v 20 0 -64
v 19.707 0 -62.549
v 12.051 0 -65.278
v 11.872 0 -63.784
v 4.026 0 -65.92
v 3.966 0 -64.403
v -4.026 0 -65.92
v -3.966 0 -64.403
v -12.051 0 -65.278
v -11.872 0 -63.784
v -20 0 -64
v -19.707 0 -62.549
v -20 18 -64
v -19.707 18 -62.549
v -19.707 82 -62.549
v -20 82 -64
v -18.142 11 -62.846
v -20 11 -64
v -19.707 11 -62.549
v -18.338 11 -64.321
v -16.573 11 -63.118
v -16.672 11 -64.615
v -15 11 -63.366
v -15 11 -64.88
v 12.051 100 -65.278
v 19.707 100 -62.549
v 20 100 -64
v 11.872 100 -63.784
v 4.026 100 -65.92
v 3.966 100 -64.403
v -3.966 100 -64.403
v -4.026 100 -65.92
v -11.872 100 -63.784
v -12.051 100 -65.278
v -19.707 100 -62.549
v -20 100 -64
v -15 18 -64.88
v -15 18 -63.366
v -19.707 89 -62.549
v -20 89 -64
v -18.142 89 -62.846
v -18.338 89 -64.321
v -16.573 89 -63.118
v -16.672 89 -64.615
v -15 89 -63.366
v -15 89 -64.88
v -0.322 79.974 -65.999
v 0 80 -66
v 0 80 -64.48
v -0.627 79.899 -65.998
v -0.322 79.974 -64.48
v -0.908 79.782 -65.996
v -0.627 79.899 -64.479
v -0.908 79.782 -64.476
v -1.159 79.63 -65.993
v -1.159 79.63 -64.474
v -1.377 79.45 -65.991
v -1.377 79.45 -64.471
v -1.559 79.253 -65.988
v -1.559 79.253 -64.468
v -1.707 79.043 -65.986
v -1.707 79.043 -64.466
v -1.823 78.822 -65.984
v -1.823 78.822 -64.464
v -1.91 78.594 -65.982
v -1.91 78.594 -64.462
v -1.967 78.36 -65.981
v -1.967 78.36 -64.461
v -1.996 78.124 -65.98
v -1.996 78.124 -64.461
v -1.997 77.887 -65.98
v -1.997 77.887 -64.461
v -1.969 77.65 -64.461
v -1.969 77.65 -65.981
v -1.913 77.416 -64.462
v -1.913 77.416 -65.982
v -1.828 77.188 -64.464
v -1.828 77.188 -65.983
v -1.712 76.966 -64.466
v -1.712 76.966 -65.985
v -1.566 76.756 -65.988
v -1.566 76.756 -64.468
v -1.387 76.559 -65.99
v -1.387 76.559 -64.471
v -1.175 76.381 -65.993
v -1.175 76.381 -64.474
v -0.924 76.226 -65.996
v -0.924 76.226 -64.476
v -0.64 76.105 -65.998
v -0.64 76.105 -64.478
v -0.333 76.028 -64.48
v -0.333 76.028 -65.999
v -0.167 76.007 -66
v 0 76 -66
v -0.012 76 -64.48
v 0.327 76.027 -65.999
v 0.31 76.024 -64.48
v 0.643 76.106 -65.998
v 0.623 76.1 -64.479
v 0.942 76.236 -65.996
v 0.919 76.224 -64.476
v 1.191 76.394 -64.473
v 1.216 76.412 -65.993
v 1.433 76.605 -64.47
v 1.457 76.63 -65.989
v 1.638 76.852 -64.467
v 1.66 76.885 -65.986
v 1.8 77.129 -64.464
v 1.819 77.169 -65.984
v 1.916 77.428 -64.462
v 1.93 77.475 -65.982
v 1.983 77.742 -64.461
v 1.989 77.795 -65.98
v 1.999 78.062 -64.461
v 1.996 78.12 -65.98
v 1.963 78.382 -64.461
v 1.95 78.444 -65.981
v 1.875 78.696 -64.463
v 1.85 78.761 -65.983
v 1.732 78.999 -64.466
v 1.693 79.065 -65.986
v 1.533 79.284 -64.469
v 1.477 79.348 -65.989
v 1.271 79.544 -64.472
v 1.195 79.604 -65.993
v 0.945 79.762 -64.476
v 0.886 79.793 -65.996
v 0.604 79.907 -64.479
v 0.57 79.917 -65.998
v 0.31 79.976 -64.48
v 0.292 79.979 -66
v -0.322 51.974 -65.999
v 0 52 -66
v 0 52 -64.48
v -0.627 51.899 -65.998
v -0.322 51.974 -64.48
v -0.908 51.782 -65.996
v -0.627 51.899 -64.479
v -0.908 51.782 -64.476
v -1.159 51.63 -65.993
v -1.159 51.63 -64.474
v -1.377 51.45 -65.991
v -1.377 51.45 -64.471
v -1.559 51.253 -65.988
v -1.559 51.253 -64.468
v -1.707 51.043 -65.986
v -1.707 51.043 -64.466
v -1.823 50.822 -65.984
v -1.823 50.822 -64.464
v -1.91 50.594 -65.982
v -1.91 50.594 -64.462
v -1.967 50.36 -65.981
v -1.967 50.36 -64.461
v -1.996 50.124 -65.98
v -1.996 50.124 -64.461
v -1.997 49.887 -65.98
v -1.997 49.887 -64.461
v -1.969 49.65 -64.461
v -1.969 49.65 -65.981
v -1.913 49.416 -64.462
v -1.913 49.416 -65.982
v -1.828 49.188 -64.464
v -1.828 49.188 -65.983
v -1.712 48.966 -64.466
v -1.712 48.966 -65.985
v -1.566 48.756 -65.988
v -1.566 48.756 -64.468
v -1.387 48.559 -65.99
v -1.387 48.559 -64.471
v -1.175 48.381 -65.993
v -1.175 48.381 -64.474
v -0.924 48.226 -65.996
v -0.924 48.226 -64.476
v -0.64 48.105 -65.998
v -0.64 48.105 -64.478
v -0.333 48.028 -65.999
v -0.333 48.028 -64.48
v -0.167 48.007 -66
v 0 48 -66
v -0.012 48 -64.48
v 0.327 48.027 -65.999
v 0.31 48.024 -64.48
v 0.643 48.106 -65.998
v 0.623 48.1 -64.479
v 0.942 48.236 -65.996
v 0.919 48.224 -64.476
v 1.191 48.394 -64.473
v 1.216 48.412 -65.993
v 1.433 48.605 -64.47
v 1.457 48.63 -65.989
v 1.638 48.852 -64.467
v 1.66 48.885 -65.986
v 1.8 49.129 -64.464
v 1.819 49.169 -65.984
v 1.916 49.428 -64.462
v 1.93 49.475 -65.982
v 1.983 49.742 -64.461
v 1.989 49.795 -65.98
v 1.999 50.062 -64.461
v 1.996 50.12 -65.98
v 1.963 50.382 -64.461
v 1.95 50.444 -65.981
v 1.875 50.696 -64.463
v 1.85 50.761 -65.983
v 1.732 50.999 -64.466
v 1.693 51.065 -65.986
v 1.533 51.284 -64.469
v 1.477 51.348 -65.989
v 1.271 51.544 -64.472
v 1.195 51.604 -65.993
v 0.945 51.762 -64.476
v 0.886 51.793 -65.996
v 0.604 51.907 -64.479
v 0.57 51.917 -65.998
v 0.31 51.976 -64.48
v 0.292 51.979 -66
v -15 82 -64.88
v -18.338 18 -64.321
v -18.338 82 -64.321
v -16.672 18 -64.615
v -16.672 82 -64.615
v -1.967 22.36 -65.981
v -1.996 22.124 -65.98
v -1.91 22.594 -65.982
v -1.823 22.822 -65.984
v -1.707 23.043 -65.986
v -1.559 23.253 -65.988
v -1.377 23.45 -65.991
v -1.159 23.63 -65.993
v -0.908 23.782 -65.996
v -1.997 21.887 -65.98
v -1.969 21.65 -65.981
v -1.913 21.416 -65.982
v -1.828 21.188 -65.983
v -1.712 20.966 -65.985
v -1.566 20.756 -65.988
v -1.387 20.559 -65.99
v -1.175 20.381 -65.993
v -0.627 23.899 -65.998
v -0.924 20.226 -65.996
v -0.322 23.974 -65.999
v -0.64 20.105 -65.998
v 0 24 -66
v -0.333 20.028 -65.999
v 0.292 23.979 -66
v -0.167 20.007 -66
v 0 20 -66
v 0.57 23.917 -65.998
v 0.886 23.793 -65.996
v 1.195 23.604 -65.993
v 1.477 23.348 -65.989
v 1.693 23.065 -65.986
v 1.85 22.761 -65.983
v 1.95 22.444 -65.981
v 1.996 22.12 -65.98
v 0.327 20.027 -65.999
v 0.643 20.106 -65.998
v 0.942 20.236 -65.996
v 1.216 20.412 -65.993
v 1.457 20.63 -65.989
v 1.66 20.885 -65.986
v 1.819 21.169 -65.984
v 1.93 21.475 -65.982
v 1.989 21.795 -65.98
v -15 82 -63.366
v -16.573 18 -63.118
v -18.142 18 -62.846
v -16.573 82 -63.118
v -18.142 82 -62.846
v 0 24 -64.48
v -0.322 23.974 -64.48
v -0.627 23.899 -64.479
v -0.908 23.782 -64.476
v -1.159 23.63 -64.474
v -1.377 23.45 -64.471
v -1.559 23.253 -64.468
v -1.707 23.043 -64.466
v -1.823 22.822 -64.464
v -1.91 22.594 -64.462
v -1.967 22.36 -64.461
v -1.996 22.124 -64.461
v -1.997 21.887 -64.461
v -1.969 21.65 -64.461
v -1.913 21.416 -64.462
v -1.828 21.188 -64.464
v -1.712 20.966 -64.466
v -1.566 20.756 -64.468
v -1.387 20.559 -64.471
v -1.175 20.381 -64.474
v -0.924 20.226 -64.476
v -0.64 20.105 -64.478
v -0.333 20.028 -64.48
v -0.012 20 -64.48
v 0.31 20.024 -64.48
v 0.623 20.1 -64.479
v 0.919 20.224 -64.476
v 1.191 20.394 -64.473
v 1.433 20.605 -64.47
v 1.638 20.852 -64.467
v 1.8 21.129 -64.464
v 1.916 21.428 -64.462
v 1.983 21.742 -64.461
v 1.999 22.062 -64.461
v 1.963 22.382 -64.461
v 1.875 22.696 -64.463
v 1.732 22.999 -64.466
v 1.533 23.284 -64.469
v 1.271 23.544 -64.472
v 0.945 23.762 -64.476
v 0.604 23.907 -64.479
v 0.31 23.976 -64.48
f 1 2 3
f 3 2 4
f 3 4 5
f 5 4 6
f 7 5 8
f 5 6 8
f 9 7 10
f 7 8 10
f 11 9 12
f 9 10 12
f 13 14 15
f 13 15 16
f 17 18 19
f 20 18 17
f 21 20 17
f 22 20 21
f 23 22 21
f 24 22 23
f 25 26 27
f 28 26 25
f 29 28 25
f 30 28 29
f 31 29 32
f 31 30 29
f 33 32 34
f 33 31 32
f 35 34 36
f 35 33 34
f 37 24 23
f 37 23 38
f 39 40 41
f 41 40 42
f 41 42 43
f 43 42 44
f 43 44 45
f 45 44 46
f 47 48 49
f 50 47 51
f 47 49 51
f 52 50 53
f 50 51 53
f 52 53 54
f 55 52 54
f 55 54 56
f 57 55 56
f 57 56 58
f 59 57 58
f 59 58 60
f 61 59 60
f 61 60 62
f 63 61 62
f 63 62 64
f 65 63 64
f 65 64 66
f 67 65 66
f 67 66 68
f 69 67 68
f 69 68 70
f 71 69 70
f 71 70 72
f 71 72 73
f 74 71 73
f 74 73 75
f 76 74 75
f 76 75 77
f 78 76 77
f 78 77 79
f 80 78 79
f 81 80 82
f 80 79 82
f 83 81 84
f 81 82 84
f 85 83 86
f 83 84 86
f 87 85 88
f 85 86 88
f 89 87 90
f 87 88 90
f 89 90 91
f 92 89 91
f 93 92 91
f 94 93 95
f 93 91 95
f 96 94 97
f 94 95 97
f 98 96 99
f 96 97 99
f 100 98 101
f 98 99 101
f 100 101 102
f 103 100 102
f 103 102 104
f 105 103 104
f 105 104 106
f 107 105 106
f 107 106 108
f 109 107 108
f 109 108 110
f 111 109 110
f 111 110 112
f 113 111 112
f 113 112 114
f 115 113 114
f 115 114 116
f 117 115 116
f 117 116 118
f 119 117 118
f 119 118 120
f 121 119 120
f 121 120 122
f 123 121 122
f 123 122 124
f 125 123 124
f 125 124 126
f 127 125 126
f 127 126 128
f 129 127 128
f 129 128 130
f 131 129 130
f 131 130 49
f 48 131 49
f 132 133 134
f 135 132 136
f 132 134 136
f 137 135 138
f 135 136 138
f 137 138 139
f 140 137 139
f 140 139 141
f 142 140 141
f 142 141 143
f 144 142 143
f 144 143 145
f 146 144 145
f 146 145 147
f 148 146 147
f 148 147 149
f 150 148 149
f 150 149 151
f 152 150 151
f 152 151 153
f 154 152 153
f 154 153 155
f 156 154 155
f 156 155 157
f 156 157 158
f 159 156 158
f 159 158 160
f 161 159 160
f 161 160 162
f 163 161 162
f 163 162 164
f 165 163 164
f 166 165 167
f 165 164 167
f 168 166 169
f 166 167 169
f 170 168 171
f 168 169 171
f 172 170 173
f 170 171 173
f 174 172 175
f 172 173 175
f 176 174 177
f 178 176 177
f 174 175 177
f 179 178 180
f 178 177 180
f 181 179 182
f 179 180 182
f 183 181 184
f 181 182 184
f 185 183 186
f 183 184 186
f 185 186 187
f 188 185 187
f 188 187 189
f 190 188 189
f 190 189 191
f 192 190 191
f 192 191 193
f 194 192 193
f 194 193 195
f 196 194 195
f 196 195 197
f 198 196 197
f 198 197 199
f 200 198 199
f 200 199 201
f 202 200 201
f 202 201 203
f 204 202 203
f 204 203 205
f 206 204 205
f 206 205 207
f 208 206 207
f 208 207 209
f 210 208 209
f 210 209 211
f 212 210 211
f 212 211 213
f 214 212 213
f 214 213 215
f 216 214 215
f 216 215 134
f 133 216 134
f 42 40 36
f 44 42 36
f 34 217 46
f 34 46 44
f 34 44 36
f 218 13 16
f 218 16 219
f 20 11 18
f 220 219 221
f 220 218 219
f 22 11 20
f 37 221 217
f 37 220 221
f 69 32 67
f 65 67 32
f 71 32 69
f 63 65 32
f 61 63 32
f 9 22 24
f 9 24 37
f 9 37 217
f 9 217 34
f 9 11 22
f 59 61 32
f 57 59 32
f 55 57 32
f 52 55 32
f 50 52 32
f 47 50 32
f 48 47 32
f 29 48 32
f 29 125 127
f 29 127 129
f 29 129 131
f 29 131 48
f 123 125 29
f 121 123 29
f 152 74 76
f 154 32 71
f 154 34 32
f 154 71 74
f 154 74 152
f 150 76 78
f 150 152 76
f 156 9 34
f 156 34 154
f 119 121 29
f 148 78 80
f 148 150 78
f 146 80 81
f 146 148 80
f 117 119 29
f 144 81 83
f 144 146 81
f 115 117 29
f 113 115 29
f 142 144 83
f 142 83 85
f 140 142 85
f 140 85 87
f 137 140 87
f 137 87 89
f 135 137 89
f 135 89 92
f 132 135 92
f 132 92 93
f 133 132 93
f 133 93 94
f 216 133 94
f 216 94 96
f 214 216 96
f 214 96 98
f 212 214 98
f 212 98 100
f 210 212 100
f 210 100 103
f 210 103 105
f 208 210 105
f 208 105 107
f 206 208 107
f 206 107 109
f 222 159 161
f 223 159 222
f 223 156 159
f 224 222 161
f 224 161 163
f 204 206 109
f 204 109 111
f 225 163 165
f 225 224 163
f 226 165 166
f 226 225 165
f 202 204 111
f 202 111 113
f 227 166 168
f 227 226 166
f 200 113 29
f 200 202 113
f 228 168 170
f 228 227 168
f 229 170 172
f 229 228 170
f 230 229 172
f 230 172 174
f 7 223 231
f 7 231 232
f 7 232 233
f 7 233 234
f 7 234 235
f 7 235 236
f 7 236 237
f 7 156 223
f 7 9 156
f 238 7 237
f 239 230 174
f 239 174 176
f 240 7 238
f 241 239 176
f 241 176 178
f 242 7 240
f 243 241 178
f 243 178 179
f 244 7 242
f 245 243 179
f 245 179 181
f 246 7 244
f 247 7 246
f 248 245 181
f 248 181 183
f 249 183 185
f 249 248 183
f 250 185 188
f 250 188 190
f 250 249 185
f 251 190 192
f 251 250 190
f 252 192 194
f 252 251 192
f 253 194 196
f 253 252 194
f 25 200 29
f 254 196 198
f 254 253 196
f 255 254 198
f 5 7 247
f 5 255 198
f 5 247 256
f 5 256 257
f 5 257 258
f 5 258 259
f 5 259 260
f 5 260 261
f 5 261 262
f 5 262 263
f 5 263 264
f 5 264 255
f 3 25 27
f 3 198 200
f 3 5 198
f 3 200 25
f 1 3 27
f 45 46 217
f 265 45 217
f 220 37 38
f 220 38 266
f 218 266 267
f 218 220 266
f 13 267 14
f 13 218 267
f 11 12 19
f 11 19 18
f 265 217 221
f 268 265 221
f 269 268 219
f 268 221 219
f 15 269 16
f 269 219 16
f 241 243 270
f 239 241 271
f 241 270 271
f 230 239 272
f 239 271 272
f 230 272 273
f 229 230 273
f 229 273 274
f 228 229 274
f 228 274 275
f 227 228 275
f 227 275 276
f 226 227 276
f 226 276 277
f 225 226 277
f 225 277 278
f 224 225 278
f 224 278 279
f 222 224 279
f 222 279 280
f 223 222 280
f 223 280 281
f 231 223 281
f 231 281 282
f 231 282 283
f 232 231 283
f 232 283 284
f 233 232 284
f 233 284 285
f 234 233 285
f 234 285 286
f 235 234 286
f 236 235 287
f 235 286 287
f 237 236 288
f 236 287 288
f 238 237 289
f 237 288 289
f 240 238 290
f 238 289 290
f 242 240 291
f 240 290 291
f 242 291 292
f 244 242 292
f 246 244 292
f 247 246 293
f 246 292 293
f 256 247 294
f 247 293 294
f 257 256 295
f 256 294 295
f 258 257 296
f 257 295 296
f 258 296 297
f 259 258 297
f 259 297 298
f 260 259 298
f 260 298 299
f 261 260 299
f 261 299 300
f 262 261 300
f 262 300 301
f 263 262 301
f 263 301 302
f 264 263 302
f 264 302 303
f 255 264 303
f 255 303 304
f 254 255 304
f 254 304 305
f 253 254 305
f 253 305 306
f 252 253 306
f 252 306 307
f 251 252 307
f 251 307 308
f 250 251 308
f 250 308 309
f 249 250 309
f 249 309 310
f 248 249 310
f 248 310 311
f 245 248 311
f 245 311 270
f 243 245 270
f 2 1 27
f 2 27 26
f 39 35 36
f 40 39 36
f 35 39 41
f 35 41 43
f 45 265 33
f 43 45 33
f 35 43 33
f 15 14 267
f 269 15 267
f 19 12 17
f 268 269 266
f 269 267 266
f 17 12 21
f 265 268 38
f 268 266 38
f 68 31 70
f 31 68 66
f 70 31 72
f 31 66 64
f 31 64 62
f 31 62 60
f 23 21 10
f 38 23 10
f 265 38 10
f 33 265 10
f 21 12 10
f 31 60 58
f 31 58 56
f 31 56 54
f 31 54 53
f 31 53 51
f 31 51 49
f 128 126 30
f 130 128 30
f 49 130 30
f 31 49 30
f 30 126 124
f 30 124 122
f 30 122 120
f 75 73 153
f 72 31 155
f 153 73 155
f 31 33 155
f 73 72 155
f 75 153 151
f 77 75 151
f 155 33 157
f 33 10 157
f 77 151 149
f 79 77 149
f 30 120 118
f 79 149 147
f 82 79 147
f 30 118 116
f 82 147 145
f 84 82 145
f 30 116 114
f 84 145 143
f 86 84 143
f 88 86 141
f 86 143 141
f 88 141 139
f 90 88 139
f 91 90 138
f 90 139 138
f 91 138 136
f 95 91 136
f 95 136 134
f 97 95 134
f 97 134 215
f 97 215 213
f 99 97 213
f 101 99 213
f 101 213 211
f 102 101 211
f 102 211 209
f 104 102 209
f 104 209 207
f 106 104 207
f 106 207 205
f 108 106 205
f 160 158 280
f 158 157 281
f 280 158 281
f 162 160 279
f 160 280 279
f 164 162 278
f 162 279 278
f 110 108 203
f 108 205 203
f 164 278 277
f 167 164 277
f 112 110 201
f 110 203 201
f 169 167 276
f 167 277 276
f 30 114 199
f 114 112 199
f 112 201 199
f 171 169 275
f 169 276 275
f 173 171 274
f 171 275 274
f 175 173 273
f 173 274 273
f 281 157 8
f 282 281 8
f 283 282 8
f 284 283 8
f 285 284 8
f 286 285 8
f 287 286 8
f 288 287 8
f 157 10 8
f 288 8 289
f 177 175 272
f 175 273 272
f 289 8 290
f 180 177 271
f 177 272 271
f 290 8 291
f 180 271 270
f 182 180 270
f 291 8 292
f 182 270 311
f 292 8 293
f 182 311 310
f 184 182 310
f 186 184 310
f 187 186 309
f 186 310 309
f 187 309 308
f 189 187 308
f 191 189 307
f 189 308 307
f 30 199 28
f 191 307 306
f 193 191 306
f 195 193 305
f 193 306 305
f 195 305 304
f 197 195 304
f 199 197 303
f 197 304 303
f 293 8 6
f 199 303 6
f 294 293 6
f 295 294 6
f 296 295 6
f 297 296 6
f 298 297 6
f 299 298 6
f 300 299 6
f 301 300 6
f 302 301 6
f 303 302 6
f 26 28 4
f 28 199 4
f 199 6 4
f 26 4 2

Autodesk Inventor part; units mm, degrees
ref_plane "YZ Plane" through (0, 0, 0) normal (1, 0, 0) x (0, 1, 0)
ref_plane "XZ Plane" through (0, 0, 0) normal (0, 1, 0) x (-1, 0, 0)
sketch "Skizze1" plane through (0, 0, 0) normal (0, 1, 0) x (-1, 0, 0)
  arc A0 (-19.7068, -62.5486) -> (19.7068, -62.5486) centre (0, 37) ccw
  line L0 (19.7068, -62.5486) -> (20, -64)
  arc A1 (-20, -64) -> (20, -64) centre (0, 35) ccw
  line L1 (-20, -64) -> (-19.7068, -62.5486)
  line L2 (0, -64.4804) -> (0, 0) construction
  point P0 (0, -64.4804)
  dimension "d0" = 2
  dimension "d1" = 101
  dimension "d2" = 40
  dimension "d3" = 35
extrude "Extrusion1" add sketch "Skizze1" along normal blind 100
ref_plane "Arbeitsebene1" through (0, 0, -66) normal (0, 0, 1) x (1, 0, 0)
sketch "Skizze2" plane through (0, 0, -66) normal (0, 0, 1) x (1, 0, 0)
  line L0 (20, 100) -> (-20, 100) projected
  point P0 (0, 0)
  point P1 (0, 78)
  point P2 (0, 50)
  point P3 (0, 22)
  dimension "d7" = 22
  dimension "d8" = 22
  dimension "d9" = 28
hole "Bohrung1" at (0, 78, -66) at (0, 50, -66) at (0, 22, -66) direction (0, 0, 1) diameter 4 end through all
sketch "Skizze3" plane through (0, 0, -66) normal (0, 0, 1) x (1, 0, 0)
  line L0 (-20, 0) -> (-20, 100) projected
  line L1 (-20, 89) -> (-15, 89)
  line L2 (-15, 89) -> (-15, 82)
  line L3 (-15, 82) -> (-20, 82)
  line L4 (20, 100) -> (-20, 100) projected
  line L5 (-20, 11) -> (-15, 11)
  line L6 (-15, 11) -> (-15, 18)
  line L7 (-15, 18) -> (-20, 18)
  line L8 (20, 0) -> (-20, 0) projected
  point P0 (0, 0)
  point P1 (-17.5, 82)
  point P2 (-17.5, 89)
  dimension "d17" = 5
  dimension "d18" = 7
  dimension "d19" = 11
  dimension "d20" = 5
  dimension "d21" = 7
  dimension "d22" = 11
extrude "Extrusion2" cut sketch "Skizze3" along normal through all
properties part number "214"
